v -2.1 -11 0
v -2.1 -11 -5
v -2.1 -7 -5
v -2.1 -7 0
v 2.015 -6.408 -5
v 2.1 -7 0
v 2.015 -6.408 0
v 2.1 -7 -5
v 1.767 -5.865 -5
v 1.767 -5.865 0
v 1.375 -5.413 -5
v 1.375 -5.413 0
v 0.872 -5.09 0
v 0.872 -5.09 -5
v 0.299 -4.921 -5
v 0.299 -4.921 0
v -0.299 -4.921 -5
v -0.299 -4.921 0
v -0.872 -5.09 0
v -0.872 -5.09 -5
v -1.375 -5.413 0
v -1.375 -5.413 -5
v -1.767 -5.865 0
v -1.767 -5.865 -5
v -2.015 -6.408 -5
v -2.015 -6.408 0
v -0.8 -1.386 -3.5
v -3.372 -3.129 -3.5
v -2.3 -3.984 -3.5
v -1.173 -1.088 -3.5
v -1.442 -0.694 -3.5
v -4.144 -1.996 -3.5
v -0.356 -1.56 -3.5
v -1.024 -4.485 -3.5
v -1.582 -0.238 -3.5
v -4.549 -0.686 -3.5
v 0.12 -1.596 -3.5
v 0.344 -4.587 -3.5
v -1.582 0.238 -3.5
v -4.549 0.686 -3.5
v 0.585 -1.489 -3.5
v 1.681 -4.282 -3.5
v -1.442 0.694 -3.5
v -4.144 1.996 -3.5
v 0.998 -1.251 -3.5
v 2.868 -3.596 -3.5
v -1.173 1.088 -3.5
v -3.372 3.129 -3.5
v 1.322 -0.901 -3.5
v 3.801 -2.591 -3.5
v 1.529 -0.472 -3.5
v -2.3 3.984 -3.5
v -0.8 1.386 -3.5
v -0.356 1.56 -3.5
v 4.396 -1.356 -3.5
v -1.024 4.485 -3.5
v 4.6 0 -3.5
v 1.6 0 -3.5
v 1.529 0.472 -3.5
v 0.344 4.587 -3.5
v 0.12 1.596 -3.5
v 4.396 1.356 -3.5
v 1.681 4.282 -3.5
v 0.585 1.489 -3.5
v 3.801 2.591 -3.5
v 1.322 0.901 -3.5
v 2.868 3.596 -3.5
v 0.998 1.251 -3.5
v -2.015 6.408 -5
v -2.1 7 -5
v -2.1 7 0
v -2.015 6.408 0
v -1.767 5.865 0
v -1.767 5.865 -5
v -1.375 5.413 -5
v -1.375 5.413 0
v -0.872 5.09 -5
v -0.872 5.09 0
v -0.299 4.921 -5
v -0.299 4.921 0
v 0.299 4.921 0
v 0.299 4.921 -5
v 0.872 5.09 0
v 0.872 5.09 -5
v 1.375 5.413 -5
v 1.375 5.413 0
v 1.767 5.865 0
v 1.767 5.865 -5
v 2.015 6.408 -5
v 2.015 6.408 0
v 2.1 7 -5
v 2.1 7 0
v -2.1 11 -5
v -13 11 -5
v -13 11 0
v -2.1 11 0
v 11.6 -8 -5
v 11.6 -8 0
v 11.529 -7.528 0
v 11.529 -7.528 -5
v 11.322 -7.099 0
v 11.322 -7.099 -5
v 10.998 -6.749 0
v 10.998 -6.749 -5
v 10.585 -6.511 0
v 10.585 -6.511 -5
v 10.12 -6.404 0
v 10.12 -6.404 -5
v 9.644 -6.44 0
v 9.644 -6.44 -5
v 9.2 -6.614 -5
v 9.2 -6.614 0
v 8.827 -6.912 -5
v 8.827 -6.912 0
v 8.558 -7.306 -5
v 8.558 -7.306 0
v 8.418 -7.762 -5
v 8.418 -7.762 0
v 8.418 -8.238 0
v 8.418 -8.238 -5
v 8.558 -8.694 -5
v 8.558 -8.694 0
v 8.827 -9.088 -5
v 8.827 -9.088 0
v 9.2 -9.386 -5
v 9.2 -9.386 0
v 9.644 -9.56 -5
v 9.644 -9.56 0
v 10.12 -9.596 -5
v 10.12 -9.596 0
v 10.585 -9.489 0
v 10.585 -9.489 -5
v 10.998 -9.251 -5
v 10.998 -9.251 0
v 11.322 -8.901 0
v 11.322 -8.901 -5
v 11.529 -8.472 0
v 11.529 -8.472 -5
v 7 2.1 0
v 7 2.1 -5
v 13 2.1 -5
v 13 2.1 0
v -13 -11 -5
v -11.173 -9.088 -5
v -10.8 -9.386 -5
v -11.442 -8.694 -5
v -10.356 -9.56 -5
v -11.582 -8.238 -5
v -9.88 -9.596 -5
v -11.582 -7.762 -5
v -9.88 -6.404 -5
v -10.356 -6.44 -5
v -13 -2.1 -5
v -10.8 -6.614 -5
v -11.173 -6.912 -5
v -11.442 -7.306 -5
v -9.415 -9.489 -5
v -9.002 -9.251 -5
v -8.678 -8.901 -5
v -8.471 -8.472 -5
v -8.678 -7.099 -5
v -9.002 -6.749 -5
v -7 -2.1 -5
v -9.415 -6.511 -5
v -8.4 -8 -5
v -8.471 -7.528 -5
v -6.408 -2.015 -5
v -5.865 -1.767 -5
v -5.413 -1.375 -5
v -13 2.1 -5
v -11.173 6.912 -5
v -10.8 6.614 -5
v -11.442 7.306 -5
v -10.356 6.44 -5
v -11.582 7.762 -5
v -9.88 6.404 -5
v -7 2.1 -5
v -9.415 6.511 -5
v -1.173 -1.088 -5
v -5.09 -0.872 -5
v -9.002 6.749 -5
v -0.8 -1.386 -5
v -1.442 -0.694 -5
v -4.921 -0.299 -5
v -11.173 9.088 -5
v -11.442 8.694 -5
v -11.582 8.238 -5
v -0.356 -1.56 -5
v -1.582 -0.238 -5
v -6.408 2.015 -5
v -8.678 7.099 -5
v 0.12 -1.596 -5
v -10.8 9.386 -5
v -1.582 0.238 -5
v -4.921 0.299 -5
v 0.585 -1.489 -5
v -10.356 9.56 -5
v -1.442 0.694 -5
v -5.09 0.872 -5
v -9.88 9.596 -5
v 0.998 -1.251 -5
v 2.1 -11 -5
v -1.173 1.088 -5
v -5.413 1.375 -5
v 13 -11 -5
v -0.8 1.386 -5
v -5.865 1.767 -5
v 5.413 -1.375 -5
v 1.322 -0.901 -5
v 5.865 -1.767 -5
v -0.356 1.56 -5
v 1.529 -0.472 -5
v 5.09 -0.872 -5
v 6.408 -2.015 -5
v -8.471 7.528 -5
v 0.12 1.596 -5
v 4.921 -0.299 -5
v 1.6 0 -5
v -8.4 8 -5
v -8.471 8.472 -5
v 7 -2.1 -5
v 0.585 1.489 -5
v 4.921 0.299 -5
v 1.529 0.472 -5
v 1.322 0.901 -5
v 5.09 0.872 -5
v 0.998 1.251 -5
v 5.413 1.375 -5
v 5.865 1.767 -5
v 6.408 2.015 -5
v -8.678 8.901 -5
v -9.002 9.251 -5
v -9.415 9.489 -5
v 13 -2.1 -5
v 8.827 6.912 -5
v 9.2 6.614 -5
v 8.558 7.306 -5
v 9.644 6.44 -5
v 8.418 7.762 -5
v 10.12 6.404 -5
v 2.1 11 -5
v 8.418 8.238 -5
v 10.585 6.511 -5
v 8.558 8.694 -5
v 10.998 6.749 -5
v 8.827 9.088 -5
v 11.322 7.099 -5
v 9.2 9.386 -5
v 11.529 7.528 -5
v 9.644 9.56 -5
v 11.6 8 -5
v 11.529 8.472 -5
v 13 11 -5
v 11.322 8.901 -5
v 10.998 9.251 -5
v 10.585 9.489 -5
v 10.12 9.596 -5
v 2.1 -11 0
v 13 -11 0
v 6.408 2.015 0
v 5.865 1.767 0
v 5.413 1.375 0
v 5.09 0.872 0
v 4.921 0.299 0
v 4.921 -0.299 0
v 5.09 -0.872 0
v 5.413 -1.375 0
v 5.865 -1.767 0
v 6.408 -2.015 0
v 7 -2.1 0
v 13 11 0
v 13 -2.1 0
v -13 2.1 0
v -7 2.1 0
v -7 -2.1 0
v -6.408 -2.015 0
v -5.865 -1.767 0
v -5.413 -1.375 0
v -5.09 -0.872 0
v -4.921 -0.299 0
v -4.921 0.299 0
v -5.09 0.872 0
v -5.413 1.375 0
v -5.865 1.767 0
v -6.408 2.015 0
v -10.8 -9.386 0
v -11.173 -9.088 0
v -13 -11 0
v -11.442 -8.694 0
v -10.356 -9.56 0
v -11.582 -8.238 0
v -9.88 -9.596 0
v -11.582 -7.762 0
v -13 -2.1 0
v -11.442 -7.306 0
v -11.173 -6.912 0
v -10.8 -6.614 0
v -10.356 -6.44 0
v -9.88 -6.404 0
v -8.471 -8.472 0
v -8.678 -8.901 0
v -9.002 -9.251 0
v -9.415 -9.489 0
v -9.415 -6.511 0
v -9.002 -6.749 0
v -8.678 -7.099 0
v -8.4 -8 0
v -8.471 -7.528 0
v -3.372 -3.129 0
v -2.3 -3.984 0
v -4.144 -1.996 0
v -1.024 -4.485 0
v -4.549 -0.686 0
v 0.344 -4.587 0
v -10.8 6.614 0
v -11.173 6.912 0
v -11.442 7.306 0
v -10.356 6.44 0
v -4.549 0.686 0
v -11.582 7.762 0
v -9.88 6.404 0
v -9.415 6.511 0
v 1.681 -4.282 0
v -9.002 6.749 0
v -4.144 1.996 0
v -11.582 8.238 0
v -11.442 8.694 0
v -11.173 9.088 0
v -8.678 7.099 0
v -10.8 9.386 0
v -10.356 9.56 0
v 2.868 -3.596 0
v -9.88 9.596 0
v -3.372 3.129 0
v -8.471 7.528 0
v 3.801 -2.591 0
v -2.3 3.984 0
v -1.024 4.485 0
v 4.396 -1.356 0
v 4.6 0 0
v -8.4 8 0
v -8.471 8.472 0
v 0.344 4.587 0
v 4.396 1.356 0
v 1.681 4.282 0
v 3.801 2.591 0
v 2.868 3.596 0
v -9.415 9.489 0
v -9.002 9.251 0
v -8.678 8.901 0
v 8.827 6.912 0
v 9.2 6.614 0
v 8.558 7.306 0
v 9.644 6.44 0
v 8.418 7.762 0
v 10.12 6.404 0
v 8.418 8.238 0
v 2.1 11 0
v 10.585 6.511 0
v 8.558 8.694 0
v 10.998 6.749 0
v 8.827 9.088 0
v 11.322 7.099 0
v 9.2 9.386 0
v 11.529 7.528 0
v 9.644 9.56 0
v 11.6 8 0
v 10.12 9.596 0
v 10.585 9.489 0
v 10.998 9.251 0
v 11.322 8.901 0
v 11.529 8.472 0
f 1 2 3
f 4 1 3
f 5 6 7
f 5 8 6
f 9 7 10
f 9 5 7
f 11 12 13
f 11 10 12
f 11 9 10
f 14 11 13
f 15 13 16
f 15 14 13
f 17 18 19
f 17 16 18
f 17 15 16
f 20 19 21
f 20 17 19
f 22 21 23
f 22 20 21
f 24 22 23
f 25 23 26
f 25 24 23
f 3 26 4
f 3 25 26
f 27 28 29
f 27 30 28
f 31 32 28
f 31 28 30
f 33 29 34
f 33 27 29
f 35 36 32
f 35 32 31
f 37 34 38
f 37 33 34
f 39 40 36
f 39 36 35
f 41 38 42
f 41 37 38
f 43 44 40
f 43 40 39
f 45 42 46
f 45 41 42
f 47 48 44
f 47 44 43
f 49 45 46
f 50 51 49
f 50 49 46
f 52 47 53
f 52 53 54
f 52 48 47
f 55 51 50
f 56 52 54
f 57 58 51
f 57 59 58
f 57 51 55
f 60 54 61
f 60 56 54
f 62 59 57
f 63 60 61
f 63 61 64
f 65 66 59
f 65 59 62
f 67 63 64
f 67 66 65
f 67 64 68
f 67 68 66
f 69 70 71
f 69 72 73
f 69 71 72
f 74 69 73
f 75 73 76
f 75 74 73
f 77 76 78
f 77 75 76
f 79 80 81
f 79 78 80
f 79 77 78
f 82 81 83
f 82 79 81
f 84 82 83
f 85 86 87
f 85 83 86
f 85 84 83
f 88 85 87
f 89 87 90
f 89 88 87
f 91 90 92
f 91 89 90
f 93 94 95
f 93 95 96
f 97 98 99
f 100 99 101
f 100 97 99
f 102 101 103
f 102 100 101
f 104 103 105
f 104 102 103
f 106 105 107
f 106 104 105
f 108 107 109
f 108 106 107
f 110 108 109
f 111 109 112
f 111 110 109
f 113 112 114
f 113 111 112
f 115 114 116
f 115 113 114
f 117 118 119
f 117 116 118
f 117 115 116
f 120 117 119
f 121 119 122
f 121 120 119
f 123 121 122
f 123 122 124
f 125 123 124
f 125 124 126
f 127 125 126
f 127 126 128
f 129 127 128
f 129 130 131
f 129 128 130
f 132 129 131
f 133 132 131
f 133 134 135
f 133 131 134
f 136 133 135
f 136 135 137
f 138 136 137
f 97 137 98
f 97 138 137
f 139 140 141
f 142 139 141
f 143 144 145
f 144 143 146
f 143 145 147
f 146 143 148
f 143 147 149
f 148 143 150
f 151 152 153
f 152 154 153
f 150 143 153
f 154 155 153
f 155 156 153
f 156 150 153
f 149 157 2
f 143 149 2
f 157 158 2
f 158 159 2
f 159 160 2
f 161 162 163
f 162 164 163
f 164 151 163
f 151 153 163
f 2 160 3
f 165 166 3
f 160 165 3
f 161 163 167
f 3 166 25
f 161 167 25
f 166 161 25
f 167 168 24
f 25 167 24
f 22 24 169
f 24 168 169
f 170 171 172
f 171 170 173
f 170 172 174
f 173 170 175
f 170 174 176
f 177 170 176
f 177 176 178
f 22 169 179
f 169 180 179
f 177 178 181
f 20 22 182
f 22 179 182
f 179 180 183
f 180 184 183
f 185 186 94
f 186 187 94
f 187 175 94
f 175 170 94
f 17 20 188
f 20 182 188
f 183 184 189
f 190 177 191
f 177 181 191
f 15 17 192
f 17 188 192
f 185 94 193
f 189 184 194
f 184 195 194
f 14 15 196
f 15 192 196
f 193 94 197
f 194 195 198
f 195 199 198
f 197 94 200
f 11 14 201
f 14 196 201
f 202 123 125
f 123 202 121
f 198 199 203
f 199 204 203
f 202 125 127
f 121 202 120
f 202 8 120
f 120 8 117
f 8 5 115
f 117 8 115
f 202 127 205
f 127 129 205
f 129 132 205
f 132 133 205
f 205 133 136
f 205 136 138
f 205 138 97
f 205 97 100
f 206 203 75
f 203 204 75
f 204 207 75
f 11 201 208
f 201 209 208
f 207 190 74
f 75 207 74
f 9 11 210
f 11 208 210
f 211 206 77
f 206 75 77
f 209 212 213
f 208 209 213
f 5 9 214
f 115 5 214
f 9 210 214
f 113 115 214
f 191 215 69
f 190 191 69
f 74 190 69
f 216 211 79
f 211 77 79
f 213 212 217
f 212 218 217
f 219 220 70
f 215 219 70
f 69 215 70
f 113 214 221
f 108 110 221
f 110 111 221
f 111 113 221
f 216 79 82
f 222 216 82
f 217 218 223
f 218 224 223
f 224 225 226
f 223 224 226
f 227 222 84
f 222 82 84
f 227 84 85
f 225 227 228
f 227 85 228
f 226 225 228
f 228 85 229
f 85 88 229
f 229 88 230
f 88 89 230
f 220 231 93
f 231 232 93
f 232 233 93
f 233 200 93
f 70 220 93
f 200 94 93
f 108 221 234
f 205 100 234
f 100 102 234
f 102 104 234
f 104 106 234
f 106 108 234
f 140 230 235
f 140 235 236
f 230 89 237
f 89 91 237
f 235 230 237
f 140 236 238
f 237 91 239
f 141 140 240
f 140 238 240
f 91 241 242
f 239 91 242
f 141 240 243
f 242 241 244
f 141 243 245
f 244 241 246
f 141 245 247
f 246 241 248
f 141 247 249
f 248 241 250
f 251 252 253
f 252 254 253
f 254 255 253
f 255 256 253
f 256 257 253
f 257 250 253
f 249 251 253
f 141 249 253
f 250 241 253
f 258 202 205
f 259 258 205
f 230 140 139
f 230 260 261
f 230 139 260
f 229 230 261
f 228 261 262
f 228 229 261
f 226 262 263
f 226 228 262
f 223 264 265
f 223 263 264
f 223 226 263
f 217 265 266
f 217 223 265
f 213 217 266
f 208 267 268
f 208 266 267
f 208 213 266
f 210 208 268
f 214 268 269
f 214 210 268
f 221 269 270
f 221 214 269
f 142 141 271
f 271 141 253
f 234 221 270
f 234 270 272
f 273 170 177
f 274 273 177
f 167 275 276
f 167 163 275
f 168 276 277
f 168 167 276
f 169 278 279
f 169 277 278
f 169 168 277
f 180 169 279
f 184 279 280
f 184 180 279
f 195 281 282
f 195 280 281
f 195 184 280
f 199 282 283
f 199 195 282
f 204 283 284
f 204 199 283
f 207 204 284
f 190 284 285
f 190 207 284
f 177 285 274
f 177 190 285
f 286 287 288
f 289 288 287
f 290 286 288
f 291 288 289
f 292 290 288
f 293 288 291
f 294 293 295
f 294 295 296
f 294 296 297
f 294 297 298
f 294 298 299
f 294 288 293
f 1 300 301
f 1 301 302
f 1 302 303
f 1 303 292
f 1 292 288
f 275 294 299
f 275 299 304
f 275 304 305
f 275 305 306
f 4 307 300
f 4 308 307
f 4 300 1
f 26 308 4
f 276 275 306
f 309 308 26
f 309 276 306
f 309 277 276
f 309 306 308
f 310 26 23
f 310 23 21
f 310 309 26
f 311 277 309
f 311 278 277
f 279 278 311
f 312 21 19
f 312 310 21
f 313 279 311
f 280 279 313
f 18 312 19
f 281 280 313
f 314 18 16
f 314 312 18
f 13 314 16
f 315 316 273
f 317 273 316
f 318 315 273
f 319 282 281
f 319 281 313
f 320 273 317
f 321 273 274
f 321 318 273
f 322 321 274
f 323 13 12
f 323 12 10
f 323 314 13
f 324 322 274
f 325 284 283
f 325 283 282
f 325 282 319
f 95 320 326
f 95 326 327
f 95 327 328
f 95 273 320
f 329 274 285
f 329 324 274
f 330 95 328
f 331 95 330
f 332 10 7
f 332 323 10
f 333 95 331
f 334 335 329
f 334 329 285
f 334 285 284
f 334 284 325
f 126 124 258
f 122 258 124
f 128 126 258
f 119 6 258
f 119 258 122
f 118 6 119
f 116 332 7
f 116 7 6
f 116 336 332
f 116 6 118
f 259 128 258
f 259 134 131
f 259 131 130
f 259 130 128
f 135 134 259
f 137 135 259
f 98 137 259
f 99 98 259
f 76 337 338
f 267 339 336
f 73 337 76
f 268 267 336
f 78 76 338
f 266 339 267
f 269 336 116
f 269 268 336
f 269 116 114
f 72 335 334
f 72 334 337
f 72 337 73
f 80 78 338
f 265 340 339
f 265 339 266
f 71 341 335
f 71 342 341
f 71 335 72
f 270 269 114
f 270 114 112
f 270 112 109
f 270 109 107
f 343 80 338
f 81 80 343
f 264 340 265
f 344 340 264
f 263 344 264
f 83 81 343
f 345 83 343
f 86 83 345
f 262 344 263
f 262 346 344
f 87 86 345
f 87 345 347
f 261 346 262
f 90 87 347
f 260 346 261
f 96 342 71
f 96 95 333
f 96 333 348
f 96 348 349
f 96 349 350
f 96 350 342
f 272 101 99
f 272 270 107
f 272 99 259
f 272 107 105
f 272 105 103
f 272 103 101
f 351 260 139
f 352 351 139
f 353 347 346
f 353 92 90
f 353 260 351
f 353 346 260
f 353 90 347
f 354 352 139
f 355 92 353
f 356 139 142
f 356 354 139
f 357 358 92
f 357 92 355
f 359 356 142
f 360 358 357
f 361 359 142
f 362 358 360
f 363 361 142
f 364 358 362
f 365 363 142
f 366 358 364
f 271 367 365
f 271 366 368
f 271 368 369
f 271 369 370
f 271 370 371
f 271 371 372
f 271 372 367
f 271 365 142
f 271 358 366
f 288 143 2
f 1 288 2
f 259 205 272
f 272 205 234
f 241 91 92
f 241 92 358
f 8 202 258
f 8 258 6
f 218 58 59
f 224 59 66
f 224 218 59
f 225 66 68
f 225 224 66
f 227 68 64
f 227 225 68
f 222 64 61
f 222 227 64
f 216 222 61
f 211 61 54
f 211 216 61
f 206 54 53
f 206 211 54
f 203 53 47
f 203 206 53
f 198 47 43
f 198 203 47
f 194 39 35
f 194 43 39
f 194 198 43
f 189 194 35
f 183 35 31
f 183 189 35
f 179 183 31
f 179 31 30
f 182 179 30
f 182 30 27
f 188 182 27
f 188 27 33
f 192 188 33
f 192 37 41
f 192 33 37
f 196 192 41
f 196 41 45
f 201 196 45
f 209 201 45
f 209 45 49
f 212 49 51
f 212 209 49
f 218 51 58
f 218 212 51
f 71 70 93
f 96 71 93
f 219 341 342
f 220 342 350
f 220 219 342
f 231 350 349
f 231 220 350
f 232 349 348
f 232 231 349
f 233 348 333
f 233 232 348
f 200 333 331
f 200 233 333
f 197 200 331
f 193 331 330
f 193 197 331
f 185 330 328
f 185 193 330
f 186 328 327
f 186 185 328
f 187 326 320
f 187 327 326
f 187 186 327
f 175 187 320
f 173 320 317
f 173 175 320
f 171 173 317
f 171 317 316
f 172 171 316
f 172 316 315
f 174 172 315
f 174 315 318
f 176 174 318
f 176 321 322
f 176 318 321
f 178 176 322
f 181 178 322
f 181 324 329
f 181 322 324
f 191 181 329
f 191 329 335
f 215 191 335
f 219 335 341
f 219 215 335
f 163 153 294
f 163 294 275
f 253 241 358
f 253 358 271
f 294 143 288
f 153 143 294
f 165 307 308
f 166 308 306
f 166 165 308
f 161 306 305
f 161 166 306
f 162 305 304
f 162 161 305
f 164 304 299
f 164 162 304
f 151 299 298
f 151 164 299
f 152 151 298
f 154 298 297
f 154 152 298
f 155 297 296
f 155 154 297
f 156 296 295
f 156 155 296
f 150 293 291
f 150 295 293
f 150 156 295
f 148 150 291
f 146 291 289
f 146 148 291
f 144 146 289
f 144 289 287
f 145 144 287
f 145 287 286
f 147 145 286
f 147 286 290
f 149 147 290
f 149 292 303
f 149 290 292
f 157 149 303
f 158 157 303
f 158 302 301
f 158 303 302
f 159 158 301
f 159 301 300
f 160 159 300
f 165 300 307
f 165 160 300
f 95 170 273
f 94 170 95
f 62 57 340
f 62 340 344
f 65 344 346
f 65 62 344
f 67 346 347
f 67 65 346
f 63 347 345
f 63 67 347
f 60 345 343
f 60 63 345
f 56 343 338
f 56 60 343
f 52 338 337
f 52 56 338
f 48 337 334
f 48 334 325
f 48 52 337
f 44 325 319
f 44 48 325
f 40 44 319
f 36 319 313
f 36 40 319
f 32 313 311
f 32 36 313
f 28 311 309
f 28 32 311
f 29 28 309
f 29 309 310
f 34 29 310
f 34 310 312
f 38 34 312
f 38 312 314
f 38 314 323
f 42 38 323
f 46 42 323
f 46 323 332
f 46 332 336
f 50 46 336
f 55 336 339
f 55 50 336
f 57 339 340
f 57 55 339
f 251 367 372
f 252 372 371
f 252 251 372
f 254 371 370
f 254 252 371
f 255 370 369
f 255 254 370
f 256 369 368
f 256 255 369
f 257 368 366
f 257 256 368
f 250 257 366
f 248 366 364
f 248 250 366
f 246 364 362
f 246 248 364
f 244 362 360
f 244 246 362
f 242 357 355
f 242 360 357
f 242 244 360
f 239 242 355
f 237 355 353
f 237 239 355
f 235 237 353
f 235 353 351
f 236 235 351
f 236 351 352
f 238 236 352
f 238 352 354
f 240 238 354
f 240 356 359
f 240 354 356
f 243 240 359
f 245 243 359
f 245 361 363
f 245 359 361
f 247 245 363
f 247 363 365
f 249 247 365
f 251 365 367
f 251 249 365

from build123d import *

# Parameters (mm, degrees)
CYLINDER974_R             = 4.6
CYLINDER974_DEPTH         = 3.5
BOX564_W                  = 4.2
BOX564_H                  = 10
BOX564_DEPTH              = 5
BOX562_W                  = 10
BOX562_H                  = 4.2
BOX562_DEPTH              = 5
BOX563_W                  = 4.2
BOX563_H                  = 10
BOX563_DEPTH              = 5
BOX561_W                  = 10
BOX561_H                  = 4.2
BOX561_DEPTH              = 5
CYLINDER073_R             = 2.1
CYLINDER073_DEPTH         = 15
CYLINDER074_R             = 2.1
CYLINDER074_DEPTH         = 15
CYLINDER075_R             = 2.1
CYLINDER075_DEPTH         = 15
CYLINDER076_R             = 2.1
CYLINDER076_DEPTH         = 15
FUSION038_PLACEMENT_ANGLE = 90
CYLINDER961_R             = 1.6
CYLINDER961_DEPTH         = 15
CYLINDER962_R             = 1.6
CYLINDER962_DEPTH         = 15
CYLINDER963_R             = 1.6
CYLINDER963_DEPTH         = 15
CYLINDER959_R             = 1.6
CYLINDER959_DEPTH         = 15
CYLINDER960_R             = 1.6
CYLINDER960_DEPTH         = 15
BOX560_W                  = 26
BOX560_H                  = 22
BOX560_DEPTH              = 5


with BuildPart() as cylinder974:
    # Cylinder974 → Cylinder974 (new body)
    with BuildSketch(Plane.XY.offset(-3.5)):
        Circle(CYLINDER974_R)
    extrude(amount=CYLINDER974_DEPTH)


with BuildPart() as cube755:
    # Box564 → Box564 (new body)
    with BuildSketch(Plane(origin=(-2.1, -17, -2), x_dir=(1, 0, 0), z_dir=(0, 0, 1))):
        with Locations((2.1, 5)):
            Rectangle(BOX564_W, BOX564_H)
    extrude(amount=BOX564_DEPTH)


with BuildPart() as cube753:
    # Box562 → Box562 (new body)
    with BuildSketch(Plane(origin=(-17, -2.1, -2), x_dir=(1, 0, 0), z_dir=(0, 0, 1))):
        with Locations((5, 2.1)):
            Rectangle(BOX562_W, BOX562_H)
    extrude(amount=BOX562_DEPTH)


with BuildPart() as cube754:
    # Box563 → Box563 (new body)
    with BuildSketch(Plane(origin=(-2.1, 7, -2), x_dir=(1, 0, 0), z_dir=(0, 0, 1))):
        with Locations((2.1, 5)):
            Rectangle(BOX563_W, BOX563_H)
    extrude(amount=BOX563_DEPTH)


with BuildPart() as fusion107:
    # Box561 → Box561 (new body)
    with BuildSketch(Plane(origin=(7, -2.1, -2), x_dir=(1, 0, 0), z_dir=(0, 0, 1))):
        with Locations((5, 2.1)):
            Rectangle(BOX561_W, BOX561_H)
    extrude(amount=BOX561_DEPTH)

    # Fusion107: union Cube755, Cube753, Cube754
    add(cube755.part)
    add(cube753.part)
    add(cube754.part)


with BuildPart() as cylinder073:
    # Cylinder073 → Cylinder073 (new body)
    with BuildSketch(Plane(origin=(7, 0, 0), x_dir=(1, 0, 0), z_dir=(0, 0, 1))):
        Circle(CYLINDER073_R)
    extrude(amount=CYLINDER073_DEPTH)


with BuildPart() as fusion037:
    # Cylinder074 → Cylinder074 (new body)
    with BuildSketch(Plane(origin=(-7, 0, 0), x_dir=(1, 0, 0), z_dir=(0, 0, 1))):
        Circle(CYLINDER074_R)
    extrude(amount=CYLINDER074_DEPTH)

    # Fusion037: union Cylinder073
    add(cylinder073.part)


with BuildPart() as cylinder075:
    # Cylinder075 → Cylinder075 (new body)
    with BuildSketch(Plane(origin=(7, 0, 0), x_dir=(1, 0, 0), z_dir=(0, 0, 1))):
        Circle(CYLINDER075_R)
    extrude(amount=CYLINDER075_DEPTH)


with BuildPart() as fusion039:
    # Cylinder076 → Cylinder076 (new body)
    with BuildSketch(Plane(origin=(-7, 0, 0), x_dir=(1, 0, 0), z_dir=(0, 0, 1))):
        Circle(CYLINDER076_R)
    extrude(amount=CYLINDER076_DEPTH)

    # Fusion038: union Cylinder075
    add(cylinder075.part)


with BuildPart() as fusion039_1:
    # Fusion038 placement: moved
    add(fusion039.part.rotate(Axis((0, 0, 0), (0, 0, 1)), FUSION038_PLACEMENT_ANGLE))

    # Fusion039: union Fusion037
    add(fusion037.part)


with BuildPart() as fusion039_2:
    # Fusion039 placement: moved
    add(fusion039_1.part.moved(Location((0, 0, -3))))


with BuildPart() as cylinder961:
    # Cylinder961 → Cylinder961 (new body)
    with BuildSketch(Plane(origin=(-10, -8, -2), x_dir=(1, 0, 0), z_dir=(0, 0, 1))):
        Circle(CYLINDER961_R)
    extrude(amount=CYLINDER961_DEPTH)


with BuildPart() as cylinder962:
    # Cylinder962 → Cylinder962 (new body)
    with BuildSketch(Plane(origin=(10, 8, -2), x_dir=(1, 0, 0), z_dir=(0, 0, 1))):
        Circle(CYLINDER962_R)
    extrude(amount=CYLINDER962_DEPTH)


with BuildPart() as cylinder963:
    # Cylinder963 → Cylinder963 (new body)
    with BuildSketch(Plane(origin=(10, -8, -2), x_dir=(1, 0, 0), z_dir=(0, 0, 1))):
        Circle(CYLINDER963_R)
    extrude(amount=CYLINDER963_DEPTH)


with BuildPart() as cylinder959:
    # Cylinder959 → Cylinder959 (new body)
    with BuildSketch(Plane.XY.offset(-2)):
        Circle(CYLINDER959_R)
    extrude(amount=CYLINDER959_DEPTH)


with BuildPart() as fusion105:
    # Cylinder960 → Cylinder960 (new body)
    with BuildSketch(Plane(origin=(-10, 8, -2), x_dir=(1, 0, 0), z_dir=(0, 0, 1))):
        Circle(CYLINDER960_R)
    extrude(amount=CYLINDER960_DEPTH)

    # Fusion105: union Cylinder961, Cylinder962, Cylinder963, Cylinder959
    add(cylinder961.part)
    add(cylinder962.part)
    add(cylinder963.part)
    add(cylinder959.part)


with BuildPart() as diff_lock_planetary_sup_holes:
    # Box560 → Box560 (new body)
    with BuildSketch(Plane(origin=(-13, -11, -2), x_dir=(1, 0, 0), z_dir=(0, 0, 1))):
        with Locations((13, 11)):
            Rectangle(BOX560_W, BOX560_H)
    extrude(amount=BOX560_DEPTH)

    # Cut014050: cut Fusion105
    add(fusion105.part, mode=Mode.SUBTRACT)

    # Cut014051: cut Fusion039
    add(fusion039_2.part, mode=Mode.SUBTRACT)

    # Cut014055: cut Fusion107
    add(fusion107.part, mode=Mode.SUBTRACT)


with BuildPart() as diff_lock_planetary_sup_holes_1:
    # Cut014055 placement: moved
    add(diff_lock_planetary_sup_holes.part.moved(Location((0, 0, -3))))

    # Cut014056: cut Cylinder974
    add(cylinder974.part, mode=Mode.SUBTRACT)


solid = diff_lock_planetary_sup_holes_1.part
